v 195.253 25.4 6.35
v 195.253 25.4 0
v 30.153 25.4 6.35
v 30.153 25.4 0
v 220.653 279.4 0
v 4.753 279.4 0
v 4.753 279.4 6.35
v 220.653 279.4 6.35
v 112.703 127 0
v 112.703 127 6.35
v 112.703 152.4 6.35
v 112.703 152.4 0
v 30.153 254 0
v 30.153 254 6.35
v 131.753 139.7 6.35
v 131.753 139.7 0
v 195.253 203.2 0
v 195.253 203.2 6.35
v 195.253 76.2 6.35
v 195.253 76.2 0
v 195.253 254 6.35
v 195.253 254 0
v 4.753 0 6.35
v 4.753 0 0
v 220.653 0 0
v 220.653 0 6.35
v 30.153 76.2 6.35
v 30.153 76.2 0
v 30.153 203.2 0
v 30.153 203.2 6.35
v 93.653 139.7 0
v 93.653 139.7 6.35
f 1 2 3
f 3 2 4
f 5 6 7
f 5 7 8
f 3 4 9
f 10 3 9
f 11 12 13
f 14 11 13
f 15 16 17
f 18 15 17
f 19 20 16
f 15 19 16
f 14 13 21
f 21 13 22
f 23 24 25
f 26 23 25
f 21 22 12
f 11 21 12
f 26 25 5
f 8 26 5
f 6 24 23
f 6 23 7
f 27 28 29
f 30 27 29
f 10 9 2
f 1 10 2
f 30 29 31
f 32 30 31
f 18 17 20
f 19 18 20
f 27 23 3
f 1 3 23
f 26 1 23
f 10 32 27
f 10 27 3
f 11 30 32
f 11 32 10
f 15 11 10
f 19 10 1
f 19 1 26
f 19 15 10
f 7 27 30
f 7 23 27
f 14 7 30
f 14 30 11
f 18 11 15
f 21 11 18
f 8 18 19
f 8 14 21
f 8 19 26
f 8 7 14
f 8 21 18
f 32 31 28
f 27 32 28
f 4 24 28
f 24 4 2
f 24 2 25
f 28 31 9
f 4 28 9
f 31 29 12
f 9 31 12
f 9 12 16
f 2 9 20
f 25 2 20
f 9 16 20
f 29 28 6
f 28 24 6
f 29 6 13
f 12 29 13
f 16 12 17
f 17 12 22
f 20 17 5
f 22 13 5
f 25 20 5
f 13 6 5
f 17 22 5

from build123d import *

# Parameters (mm, degrees)
F0_W     = 215.9
F0_H     = 279.4
F1_DEPTH = 6.35


with BuildPart() as f1:
    # F0 (on Top) → F1 (new body)
    with BuildSketch(Plane.XY):
        with Locations((112.702514, 139.7)):
            Rectangle(F0_W, F0_H)
        Polygon((30.152514, 25.4), (112.702514, 127), (195.252514, 25.4), align=None, mode=Mode.SUBTRACT)
        Polygon((30.152514, 76.2), (30.152514, 203.2), (93.652514, 139.7), align=None, mode=Mode.SUBTRACT)
        Polygon((112.702514, 152.4), (30.152514, 254), (195.252514, 254), align=None, mode=Mode.SUBTRACT)
        Polygon((195.252514, 76.2), (131.752514, 139.7), (195.252514, 203.2), align=None, mode=Mode.SUBTRACT)
    extrude(amount=F1_DEPTH)


solid = f1.part
